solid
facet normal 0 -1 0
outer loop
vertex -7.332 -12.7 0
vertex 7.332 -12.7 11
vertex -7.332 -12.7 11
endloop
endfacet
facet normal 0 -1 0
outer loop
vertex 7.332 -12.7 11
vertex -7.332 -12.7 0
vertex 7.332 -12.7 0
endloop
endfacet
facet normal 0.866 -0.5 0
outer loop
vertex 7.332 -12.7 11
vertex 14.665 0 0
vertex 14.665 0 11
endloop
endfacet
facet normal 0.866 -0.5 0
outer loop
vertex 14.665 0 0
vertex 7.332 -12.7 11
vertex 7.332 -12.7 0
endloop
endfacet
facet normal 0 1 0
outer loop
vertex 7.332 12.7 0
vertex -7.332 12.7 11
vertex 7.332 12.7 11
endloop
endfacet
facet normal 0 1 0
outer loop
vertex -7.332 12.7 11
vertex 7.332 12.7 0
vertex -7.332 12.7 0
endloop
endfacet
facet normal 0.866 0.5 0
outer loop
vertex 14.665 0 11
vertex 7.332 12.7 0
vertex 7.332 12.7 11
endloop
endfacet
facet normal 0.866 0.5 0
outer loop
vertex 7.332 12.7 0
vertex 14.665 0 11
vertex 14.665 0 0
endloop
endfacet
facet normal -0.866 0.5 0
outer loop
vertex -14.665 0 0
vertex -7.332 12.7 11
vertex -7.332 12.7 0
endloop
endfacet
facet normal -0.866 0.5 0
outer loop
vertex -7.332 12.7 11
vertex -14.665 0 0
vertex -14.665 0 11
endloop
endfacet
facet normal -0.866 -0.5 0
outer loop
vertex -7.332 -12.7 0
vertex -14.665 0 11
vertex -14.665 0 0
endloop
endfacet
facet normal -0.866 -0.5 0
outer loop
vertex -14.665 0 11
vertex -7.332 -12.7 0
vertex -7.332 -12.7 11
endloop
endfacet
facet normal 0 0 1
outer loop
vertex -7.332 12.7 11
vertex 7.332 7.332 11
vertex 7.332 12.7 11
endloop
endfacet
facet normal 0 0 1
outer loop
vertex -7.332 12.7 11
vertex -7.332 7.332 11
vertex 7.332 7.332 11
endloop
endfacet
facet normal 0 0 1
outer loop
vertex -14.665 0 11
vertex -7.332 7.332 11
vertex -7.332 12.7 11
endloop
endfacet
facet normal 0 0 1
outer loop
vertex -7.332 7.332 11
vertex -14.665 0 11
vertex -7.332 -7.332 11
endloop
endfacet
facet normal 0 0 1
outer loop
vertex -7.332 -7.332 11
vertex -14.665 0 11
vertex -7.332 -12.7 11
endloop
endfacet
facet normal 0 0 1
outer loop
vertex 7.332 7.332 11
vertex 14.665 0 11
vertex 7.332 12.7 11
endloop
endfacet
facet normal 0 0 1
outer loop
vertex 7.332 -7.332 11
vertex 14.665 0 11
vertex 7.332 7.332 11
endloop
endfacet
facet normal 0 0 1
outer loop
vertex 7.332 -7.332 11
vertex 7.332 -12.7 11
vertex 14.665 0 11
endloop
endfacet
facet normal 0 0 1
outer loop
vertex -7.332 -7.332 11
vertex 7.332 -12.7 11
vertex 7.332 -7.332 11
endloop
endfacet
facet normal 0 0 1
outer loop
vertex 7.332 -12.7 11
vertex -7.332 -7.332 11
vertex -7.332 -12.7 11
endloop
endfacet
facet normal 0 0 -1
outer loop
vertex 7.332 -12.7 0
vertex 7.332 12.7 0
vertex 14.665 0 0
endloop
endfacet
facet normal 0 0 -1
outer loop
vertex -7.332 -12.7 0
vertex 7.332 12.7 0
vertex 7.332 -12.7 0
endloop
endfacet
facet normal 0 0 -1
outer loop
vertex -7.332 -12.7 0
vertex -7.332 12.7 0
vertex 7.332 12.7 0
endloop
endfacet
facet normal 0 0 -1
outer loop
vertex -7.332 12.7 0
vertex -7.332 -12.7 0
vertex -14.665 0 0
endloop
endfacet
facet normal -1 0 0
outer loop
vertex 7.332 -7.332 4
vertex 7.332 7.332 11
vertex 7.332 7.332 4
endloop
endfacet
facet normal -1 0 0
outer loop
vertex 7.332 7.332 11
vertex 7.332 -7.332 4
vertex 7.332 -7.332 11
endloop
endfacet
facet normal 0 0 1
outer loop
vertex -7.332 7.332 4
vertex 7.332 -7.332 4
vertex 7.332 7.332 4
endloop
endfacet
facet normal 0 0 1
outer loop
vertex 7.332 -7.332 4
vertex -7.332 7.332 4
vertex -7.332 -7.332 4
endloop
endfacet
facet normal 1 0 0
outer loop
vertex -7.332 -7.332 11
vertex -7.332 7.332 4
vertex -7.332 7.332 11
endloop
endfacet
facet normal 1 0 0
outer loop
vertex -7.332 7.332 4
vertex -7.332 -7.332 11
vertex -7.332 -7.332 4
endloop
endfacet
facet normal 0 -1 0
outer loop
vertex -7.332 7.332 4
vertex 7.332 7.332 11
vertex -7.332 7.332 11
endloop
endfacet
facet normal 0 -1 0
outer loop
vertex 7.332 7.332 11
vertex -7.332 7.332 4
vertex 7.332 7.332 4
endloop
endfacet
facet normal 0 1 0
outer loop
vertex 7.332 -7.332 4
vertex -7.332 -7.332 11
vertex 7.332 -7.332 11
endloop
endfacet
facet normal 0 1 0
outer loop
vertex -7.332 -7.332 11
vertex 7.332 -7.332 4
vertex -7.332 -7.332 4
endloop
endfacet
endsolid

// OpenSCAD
foamHeight=7;
width=25.4/sin(60);
base=4;
difference() {
    cylinder(d=width, h=foamHeight+base, $fn=6, center=false);
    translate([-1*(width/4),-1*(width/4),base]) cube([width/2,width/2,width/2], center=false);
}
